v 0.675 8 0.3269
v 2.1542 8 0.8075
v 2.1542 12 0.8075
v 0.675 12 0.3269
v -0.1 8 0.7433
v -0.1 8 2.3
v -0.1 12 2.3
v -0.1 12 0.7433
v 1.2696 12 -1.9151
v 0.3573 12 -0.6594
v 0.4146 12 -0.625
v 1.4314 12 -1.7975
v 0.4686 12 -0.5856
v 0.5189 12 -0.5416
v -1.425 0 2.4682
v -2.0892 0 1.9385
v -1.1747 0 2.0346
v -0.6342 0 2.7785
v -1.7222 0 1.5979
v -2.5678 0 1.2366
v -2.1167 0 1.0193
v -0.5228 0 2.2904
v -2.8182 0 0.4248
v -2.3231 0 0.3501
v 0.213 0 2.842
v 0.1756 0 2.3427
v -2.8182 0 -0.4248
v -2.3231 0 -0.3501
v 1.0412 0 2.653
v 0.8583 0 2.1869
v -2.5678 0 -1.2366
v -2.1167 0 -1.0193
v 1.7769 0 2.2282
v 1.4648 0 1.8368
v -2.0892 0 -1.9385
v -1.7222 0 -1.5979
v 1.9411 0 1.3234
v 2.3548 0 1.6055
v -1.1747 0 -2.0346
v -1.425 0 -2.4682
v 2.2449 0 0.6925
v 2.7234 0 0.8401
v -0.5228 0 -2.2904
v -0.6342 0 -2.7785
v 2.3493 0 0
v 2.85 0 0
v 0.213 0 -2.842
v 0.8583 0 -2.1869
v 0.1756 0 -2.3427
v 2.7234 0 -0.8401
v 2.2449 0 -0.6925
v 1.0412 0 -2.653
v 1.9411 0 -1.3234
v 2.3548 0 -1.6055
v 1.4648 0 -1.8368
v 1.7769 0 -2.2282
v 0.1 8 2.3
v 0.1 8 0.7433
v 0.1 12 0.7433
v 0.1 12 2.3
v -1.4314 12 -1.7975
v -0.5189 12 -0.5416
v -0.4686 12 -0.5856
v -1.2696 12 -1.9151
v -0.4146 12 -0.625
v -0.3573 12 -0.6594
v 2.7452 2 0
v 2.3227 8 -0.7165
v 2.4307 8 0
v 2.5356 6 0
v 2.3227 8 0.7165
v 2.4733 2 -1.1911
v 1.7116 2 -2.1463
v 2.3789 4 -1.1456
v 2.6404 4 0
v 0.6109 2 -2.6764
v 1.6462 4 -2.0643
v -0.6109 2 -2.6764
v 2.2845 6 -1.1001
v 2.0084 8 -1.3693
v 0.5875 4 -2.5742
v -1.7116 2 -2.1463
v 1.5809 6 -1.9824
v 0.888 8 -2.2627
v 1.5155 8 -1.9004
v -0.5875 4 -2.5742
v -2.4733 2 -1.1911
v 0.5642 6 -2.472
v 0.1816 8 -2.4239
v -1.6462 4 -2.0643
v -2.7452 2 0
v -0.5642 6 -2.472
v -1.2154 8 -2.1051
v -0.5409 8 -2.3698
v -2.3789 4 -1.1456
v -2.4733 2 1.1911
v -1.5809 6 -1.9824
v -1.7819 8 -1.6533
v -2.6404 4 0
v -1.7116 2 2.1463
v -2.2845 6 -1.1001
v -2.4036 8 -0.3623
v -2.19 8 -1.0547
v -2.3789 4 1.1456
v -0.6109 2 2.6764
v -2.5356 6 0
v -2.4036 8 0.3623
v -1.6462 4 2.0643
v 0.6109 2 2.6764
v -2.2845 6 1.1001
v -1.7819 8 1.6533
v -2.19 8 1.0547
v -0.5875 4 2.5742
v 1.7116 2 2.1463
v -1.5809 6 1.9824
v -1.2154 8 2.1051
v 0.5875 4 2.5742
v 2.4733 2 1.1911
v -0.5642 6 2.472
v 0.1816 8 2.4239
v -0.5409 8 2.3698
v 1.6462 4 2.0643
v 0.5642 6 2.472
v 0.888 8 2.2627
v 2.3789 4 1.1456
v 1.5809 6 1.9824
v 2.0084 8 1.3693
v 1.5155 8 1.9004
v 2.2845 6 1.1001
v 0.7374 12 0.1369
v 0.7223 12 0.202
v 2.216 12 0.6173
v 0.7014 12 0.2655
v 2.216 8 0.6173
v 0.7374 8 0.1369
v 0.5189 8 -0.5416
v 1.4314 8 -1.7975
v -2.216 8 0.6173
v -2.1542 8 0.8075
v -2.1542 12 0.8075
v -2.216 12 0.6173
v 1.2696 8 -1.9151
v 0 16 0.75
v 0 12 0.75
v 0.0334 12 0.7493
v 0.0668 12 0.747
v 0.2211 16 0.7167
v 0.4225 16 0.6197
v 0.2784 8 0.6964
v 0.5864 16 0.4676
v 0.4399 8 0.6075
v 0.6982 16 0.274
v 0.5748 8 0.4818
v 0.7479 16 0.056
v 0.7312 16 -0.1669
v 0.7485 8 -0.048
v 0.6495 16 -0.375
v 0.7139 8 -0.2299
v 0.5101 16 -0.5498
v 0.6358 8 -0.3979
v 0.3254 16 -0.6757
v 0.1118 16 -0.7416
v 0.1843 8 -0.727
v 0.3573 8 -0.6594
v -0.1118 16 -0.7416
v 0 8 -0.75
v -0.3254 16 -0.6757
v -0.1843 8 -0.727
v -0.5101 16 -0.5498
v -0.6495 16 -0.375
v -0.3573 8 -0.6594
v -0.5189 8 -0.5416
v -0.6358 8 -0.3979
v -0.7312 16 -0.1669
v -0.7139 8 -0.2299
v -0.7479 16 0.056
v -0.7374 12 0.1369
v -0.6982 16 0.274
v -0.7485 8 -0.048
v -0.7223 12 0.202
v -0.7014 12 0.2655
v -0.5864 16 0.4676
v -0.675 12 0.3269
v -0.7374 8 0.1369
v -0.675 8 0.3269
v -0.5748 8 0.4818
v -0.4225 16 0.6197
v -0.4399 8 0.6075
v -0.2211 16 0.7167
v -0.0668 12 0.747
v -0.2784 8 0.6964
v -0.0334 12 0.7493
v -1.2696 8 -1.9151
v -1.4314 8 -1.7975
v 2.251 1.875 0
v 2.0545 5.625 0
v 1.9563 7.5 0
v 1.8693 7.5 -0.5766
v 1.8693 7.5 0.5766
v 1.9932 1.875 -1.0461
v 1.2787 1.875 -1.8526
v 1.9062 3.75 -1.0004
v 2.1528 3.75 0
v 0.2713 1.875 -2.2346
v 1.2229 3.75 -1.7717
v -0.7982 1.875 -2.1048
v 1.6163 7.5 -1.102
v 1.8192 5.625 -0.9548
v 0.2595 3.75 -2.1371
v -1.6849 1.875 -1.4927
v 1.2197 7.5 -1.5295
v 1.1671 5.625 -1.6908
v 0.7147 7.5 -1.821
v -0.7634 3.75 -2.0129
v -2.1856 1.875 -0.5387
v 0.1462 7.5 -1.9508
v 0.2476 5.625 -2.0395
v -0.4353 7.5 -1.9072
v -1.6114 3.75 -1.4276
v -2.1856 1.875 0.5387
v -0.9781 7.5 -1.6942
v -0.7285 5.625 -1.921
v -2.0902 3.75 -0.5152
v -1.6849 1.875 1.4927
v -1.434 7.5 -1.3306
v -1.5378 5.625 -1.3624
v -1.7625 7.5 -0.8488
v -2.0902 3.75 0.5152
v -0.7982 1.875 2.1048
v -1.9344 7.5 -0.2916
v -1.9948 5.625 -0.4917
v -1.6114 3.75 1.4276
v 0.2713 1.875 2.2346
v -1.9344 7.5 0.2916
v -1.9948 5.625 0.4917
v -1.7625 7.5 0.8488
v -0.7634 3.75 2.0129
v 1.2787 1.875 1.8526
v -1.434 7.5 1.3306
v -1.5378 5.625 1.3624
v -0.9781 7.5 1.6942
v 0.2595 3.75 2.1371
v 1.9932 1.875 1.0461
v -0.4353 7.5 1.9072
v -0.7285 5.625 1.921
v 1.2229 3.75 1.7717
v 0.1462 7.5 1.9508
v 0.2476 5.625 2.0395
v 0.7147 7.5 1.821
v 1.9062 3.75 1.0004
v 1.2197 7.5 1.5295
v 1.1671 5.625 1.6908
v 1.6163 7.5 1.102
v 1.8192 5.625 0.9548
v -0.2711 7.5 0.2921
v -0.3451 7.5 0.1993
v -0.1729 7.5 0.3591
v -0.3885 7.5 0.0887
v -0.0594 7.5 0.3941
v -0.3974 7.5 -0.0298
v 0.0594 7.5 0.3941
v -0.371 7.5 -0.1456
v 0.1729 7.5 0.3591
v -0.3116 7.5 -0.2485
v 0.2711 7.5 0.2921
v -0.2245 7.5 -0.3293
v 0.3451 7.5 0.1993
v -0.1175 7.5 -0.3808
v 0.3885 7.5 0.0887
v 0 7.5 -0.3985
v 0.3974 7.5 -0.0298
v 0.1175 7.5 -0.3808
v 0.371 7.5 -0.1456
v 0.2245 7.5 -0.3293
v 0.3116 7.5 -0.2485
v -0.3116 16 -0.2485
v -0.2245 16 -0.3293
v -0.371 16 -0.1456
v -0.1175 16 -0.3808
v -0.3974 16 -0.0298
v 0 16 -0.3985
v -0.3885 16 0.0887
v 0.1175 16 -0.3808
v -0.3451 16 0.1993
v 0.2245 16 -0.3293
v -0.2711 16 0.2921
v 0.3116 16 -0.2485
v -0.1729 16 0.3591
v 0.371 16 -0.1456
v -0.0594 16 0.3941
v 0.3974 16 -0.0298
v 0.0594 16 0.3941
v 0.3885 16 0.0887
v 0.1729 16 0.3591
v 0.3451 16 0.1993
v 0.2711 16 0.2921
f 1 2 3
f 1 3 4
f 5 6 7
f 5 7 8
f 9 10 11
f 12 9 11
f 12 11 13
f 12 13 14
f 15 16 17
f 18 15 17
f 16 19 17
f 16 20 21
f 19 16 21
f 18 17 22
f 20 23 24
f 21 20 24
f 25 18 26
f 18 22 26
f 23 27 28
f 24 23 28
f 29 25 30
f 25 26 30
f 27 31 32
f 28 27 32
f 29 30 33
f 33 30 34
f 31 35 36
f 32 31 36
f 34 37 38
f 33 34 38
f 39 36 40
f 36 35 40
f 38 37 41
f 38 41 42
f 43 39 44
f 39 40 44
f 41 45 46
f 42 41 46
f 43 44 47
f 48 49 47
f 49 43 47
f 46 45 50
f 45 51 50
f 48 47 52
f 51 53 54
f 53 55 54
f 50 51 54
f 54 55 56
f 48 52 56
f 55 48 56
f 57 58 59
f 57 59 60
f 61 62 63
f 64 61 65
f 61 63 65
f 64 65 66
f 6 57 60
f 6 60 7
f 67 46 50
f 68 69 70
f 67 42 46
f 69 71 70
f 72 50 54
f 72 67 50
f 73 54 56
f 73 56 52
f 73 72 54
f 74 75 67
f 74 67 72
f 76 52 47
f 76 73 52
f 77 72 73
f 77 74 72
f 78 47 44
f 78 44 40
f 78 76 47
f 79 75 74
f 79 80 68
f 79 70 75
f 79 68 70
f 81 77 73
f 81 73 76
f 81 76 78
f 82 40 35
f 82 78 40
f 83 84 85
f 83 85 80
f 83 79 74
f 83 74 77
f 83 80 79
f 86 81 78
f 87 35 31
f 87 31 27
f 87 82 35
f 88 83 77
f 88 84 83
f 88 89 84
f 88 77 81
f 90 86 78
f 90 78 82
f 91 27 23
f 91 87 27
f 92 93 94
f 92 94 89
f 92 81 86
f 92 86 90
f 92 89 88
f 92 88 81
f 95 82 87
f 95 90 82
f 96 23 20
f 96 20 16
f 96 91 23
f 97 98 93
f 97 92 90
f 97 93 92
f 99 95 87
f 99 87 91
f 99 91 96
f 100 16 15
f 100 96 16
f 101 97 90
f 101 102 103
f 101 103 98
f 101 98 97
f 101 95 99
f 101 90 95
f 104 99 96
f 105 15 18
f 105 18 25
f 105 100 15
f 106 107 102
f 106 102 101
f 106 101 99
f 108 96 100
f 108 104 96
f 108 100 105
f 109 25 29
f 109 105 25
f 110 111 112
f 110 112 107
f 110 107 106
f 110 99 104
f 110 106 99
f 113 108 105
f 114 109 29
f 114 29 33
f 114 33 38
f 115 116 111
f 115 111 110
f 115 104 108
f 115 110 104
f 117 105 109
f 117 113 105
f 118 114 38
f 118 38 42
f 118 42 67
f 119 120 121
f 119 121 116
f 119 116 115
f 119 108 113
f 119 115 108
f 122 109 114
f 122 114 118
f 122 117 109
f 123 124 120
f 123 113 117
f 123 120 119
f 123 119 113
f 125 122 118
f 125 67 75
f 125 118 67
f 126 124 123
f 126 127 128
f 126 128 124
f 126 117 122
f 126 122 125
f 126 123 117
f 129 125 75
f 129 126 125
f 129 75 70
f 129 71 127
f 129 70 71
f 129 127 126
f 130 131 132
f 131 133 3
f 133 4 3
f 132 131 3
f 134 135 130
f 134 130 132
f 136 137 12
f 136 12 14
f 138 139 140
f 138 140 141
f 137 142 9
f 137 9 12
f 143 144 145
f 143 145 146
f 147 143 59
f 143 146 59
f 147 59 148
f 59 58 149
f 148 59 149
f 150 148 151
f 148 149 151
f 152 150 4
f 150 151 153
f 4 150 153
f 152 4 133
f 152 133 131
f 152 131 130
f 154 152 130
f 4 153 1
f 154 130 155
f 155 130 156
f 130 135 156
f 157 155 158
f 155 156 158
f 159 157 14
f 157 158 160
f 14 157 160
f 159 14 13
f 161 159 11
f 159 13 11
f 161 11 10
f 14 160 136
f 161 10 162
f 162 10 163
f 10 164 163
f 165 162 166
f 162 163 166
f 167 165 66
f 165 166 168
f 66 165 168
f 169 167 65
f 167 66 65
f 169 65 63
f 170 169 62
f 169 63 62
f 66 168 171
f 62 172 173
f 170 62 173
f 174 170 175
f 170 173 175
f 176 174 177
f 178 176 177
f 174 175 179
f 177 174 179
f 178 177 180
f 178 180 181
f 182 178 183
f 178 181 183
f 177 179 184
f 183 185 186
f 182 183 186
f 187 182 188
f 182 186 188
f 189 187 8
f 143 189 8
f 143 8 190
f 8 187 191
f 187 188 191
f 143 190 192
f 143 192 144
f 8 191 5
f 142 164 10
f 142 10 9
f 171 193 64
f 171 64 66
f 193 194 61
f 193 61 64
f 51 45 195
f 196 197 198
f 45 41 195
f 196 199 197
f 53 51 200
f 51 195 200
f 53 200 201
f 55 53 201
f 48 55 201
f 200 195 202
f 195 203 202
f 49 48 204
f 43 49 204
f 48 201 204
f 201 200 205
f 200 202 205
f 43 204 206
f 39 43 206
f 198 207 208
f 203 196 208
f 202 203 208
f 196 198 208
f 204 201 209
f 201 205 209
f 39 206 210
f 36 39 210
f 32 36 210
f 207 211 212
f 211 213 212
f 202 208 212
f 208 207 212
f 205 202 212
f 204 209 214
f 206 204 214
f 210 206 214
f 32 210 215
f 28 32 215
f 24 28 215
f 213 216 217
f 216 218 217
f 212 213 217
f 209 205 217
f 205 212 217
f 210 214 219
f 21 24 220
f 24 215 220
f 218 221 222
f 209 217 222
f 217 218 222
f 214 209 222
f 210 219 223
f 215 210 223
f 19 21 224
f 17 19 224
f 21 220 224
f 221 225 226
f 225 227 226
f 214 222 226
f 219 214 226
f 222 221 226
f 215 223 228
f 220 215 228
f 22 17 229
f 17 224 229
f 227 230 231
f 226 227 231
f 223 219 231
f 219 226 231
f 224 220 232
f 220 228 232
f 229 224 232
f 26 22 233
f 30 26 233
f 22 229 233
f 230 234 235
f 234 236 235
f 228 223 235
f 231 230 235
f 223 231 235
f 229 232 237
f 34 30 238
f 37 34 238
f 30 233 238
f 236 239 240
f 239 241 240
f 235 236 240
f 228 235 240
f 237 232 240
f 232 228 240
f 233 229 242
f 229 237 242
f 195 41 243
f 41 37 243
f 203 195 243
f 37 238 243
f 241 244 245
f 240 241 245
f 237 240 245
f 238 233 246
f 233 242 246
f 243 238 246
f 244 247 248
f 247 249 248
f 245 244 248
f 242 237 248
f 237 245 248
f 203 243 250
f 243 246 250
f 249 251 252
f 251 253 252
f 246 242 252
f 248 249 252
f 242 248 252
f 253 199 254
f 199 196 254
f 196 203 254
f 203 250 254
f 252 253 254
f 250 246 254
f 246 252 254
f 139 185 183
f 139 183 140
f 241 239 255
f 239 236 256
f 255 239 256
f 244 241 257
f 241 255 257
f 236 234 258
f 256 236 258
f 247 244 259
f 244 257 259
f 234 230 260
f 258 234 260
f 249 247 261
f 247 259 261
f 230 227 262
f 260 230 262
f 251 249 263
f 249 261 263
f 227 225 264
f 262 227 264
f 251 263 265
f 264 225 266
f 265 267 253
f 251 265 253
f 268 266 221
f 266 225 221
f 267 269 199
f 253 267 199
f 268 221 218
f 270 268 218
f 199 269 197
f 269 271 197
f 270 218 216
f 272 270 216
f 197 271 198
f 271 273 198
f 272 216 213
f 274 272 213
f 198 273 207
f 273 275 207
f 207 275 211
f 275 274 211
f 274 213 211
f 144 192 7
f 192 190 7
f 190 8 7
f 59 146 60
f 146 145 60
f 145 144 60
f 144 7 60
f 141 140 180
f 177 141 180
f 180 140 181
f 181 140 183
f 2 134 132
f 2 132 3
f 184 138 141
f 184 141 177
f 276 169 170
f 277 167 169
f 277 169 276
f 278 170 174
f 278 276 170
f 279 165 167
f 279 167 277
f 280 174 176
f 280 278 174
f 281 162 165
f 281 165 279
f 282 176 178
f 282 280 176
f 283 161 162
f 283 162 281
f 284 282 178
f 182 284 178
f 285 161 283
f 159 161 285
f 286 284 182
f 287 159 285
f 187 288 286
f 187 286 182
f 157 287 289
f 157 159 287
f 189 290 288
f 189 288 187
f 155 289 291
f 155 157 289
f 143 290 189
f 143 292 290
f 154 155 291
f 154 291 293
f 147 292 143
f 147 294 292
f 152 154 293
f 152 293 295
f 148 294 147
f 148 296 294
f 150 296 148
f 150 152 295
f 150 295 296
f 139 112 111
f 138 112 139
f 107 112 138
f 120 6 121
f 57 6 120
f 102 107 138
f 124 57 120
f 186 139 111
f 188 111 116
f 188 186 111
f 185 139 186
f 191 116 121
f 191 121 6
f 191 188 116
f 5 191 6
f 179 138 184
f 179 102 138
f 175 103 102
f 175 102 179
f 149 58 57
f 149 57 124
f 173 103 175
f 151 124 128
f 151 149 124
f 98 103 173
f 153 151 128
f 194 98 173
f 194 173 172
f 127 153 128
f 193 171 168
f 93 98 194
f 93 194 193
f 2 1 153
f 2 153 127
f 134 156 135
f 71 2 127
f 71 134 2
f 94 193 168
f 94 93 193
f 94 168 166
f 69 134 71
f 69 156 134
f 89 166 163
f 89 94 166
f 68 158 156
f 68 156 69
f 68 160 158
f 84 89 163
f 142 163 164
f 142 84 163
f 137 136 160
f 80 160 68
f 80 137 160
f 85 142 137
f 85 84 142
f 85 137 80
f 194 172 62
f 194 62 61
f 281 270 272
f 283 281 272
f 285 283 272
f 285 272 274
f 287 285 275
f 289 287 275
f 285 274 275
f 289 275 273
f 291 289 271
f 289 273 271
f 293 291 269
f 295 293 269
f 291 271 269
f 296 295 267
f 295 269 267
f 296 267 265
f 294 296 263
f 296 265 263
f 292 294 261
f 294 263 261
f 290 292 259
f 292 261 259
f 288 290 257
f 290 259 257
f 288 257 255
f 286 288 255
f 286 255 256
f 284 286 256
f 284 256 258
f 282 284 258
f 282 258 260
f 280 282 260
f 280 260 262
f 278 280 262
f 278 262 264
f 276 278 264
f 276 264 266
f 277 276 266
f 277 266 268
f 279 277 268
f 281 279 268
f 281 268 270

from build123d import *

# Parameters (mm, degrees)
SKETCH1_R          = 2.85
EXTRUDE1_DEPTH     = 8
EXTRUDE1_TAPER     = 3
SHELL1_T           = -0.5
SKETCH3_R          = 0.75
EXTRUDE2_DEPTH     = 8
EXTRUDE3_DEPTH     = 4
SKETCH5_R          = 0.398521604
CUT_EXTRUDE1_DEPTH = 10.407178171


with BuildPart() as part:
    # Sketch1 → Extrude1 (new body)
    with BuildSketch(Plane(origin=(0, 0, 0), x_dir=(1, 0, 0), z_dir=(0, 1, 0))):
        Circle(SKETCH1_R)
    extrude(amount=EXTRUDE1_DEPTH, taper=EXTRUDE1_TAPER)

    # Shell1
    shell1_openings = [part.faces().sort_by_distance(p)[0] for p in [
        (0, 0, 0),
    ]]
    offset(amount=SHELL1_T, openings=shell1_openings, kind=Kind.INTERSECTION)

    # Sketch3 → Extrude2 (add)
    with BuildSketch(Plane(origin=(0, 8, 0), x_dir=(-1, 0, 0), z_dir=(0, 1, 0))):
        with Locations(Location((0, 0, 0), (0, 0, 90))):
            Circle(SKETCH3_R)
    extrude(amount=EXTRUDE2_DEPTH)

    # Sketch4 → Extrude3 (add)
    with BuildSketch(Plane(origin=(0, 8, 0), x_dir=(-1, 0, 0), z_dir=(0, 1, 0))):
        with BuildLine():
            Line((0.664541882, 0.323529903), (2.154187801, 0.807545202))
            Line((2.154187801, 0.807545202), (2.2159912, 0.617333899))
            Line((2.2159912, 0.617333899), (0.7269532, 0.133516124))
            ThreePointArc((0.7269532, 0.133516124), (0.702204351, 0.230643797), (0.664541882, 0.323529903))
        make_face()
        with BuildLine():
            Line((-0.1, 0.732316537), (-0.1, 2.3))
            Line((-0.1, 2.3), (0.1, 2.3))
            Line((0.1, 2.3), (0.1, 0.732316537))
            ThreePointArc((0.1, 0.732316537), (0, 0.739112651), (-0.1, 0.732316537))
        make_face()
        with BuildLine():
            Line((0.512399846, -0.532666789), (1.431361279, -1.797508691))
            Line((1.431361279, -1.797508691), (1.26955788, -1.915065741))
            Line((1.26955788, -1.915065741), (0.350828651, -0.650543441))
            ThreePointArc((0.350828651, -0.650543441), (0.435619772, -0.597095407), (0.512399846, -0.532666789))
        make_face()
        with BuildLine():
            Line((-0.350828651, -0.650543441), (-1.26955788, -1.915065741))
            Line((-1.26955788, -1.915065741), (-1.431361279, -1.797508691))
            Line((-1.431361279, -1.797508691), (-0.512399846, -0.532666789))
            ThreePointArc((-0.512399846, -0.532666789), (-0.435619772, -0.597095407), (-0.350828651, -0.650543441))
        make_face()
        with BuildLine():
            Line((-0.7269532, 0.133516124), (-2.2159912, 0.617333899))
            Line((-2.2159912, 0.617333899), (-2.154187801, 0.807545202))
            Line((-2.154187801, 0.807545202), (-0.664541882, 0.323529903))
            ThreePointArc((-0.664541882, 0.323529903), (-0.702204351, 0.230643797), (-0.7269532, 0.133516124))
        make_face()
    extrude(amount=EXTRUDE3_DEPTH)

    # Sketch5 → Cut-Extrude1 (cut, through all)
    with BuildSketch(Plane.XZ.offset(-7.5)):
        with Locations(Location((0, 0, 0), (0, 0, 270))):
            Circle(SKETCH5_R)
    extrude(amount=-CUT_EXTRUDE1_DEPTH, mode=Mode.SUBTRACT)


solid = part.part
